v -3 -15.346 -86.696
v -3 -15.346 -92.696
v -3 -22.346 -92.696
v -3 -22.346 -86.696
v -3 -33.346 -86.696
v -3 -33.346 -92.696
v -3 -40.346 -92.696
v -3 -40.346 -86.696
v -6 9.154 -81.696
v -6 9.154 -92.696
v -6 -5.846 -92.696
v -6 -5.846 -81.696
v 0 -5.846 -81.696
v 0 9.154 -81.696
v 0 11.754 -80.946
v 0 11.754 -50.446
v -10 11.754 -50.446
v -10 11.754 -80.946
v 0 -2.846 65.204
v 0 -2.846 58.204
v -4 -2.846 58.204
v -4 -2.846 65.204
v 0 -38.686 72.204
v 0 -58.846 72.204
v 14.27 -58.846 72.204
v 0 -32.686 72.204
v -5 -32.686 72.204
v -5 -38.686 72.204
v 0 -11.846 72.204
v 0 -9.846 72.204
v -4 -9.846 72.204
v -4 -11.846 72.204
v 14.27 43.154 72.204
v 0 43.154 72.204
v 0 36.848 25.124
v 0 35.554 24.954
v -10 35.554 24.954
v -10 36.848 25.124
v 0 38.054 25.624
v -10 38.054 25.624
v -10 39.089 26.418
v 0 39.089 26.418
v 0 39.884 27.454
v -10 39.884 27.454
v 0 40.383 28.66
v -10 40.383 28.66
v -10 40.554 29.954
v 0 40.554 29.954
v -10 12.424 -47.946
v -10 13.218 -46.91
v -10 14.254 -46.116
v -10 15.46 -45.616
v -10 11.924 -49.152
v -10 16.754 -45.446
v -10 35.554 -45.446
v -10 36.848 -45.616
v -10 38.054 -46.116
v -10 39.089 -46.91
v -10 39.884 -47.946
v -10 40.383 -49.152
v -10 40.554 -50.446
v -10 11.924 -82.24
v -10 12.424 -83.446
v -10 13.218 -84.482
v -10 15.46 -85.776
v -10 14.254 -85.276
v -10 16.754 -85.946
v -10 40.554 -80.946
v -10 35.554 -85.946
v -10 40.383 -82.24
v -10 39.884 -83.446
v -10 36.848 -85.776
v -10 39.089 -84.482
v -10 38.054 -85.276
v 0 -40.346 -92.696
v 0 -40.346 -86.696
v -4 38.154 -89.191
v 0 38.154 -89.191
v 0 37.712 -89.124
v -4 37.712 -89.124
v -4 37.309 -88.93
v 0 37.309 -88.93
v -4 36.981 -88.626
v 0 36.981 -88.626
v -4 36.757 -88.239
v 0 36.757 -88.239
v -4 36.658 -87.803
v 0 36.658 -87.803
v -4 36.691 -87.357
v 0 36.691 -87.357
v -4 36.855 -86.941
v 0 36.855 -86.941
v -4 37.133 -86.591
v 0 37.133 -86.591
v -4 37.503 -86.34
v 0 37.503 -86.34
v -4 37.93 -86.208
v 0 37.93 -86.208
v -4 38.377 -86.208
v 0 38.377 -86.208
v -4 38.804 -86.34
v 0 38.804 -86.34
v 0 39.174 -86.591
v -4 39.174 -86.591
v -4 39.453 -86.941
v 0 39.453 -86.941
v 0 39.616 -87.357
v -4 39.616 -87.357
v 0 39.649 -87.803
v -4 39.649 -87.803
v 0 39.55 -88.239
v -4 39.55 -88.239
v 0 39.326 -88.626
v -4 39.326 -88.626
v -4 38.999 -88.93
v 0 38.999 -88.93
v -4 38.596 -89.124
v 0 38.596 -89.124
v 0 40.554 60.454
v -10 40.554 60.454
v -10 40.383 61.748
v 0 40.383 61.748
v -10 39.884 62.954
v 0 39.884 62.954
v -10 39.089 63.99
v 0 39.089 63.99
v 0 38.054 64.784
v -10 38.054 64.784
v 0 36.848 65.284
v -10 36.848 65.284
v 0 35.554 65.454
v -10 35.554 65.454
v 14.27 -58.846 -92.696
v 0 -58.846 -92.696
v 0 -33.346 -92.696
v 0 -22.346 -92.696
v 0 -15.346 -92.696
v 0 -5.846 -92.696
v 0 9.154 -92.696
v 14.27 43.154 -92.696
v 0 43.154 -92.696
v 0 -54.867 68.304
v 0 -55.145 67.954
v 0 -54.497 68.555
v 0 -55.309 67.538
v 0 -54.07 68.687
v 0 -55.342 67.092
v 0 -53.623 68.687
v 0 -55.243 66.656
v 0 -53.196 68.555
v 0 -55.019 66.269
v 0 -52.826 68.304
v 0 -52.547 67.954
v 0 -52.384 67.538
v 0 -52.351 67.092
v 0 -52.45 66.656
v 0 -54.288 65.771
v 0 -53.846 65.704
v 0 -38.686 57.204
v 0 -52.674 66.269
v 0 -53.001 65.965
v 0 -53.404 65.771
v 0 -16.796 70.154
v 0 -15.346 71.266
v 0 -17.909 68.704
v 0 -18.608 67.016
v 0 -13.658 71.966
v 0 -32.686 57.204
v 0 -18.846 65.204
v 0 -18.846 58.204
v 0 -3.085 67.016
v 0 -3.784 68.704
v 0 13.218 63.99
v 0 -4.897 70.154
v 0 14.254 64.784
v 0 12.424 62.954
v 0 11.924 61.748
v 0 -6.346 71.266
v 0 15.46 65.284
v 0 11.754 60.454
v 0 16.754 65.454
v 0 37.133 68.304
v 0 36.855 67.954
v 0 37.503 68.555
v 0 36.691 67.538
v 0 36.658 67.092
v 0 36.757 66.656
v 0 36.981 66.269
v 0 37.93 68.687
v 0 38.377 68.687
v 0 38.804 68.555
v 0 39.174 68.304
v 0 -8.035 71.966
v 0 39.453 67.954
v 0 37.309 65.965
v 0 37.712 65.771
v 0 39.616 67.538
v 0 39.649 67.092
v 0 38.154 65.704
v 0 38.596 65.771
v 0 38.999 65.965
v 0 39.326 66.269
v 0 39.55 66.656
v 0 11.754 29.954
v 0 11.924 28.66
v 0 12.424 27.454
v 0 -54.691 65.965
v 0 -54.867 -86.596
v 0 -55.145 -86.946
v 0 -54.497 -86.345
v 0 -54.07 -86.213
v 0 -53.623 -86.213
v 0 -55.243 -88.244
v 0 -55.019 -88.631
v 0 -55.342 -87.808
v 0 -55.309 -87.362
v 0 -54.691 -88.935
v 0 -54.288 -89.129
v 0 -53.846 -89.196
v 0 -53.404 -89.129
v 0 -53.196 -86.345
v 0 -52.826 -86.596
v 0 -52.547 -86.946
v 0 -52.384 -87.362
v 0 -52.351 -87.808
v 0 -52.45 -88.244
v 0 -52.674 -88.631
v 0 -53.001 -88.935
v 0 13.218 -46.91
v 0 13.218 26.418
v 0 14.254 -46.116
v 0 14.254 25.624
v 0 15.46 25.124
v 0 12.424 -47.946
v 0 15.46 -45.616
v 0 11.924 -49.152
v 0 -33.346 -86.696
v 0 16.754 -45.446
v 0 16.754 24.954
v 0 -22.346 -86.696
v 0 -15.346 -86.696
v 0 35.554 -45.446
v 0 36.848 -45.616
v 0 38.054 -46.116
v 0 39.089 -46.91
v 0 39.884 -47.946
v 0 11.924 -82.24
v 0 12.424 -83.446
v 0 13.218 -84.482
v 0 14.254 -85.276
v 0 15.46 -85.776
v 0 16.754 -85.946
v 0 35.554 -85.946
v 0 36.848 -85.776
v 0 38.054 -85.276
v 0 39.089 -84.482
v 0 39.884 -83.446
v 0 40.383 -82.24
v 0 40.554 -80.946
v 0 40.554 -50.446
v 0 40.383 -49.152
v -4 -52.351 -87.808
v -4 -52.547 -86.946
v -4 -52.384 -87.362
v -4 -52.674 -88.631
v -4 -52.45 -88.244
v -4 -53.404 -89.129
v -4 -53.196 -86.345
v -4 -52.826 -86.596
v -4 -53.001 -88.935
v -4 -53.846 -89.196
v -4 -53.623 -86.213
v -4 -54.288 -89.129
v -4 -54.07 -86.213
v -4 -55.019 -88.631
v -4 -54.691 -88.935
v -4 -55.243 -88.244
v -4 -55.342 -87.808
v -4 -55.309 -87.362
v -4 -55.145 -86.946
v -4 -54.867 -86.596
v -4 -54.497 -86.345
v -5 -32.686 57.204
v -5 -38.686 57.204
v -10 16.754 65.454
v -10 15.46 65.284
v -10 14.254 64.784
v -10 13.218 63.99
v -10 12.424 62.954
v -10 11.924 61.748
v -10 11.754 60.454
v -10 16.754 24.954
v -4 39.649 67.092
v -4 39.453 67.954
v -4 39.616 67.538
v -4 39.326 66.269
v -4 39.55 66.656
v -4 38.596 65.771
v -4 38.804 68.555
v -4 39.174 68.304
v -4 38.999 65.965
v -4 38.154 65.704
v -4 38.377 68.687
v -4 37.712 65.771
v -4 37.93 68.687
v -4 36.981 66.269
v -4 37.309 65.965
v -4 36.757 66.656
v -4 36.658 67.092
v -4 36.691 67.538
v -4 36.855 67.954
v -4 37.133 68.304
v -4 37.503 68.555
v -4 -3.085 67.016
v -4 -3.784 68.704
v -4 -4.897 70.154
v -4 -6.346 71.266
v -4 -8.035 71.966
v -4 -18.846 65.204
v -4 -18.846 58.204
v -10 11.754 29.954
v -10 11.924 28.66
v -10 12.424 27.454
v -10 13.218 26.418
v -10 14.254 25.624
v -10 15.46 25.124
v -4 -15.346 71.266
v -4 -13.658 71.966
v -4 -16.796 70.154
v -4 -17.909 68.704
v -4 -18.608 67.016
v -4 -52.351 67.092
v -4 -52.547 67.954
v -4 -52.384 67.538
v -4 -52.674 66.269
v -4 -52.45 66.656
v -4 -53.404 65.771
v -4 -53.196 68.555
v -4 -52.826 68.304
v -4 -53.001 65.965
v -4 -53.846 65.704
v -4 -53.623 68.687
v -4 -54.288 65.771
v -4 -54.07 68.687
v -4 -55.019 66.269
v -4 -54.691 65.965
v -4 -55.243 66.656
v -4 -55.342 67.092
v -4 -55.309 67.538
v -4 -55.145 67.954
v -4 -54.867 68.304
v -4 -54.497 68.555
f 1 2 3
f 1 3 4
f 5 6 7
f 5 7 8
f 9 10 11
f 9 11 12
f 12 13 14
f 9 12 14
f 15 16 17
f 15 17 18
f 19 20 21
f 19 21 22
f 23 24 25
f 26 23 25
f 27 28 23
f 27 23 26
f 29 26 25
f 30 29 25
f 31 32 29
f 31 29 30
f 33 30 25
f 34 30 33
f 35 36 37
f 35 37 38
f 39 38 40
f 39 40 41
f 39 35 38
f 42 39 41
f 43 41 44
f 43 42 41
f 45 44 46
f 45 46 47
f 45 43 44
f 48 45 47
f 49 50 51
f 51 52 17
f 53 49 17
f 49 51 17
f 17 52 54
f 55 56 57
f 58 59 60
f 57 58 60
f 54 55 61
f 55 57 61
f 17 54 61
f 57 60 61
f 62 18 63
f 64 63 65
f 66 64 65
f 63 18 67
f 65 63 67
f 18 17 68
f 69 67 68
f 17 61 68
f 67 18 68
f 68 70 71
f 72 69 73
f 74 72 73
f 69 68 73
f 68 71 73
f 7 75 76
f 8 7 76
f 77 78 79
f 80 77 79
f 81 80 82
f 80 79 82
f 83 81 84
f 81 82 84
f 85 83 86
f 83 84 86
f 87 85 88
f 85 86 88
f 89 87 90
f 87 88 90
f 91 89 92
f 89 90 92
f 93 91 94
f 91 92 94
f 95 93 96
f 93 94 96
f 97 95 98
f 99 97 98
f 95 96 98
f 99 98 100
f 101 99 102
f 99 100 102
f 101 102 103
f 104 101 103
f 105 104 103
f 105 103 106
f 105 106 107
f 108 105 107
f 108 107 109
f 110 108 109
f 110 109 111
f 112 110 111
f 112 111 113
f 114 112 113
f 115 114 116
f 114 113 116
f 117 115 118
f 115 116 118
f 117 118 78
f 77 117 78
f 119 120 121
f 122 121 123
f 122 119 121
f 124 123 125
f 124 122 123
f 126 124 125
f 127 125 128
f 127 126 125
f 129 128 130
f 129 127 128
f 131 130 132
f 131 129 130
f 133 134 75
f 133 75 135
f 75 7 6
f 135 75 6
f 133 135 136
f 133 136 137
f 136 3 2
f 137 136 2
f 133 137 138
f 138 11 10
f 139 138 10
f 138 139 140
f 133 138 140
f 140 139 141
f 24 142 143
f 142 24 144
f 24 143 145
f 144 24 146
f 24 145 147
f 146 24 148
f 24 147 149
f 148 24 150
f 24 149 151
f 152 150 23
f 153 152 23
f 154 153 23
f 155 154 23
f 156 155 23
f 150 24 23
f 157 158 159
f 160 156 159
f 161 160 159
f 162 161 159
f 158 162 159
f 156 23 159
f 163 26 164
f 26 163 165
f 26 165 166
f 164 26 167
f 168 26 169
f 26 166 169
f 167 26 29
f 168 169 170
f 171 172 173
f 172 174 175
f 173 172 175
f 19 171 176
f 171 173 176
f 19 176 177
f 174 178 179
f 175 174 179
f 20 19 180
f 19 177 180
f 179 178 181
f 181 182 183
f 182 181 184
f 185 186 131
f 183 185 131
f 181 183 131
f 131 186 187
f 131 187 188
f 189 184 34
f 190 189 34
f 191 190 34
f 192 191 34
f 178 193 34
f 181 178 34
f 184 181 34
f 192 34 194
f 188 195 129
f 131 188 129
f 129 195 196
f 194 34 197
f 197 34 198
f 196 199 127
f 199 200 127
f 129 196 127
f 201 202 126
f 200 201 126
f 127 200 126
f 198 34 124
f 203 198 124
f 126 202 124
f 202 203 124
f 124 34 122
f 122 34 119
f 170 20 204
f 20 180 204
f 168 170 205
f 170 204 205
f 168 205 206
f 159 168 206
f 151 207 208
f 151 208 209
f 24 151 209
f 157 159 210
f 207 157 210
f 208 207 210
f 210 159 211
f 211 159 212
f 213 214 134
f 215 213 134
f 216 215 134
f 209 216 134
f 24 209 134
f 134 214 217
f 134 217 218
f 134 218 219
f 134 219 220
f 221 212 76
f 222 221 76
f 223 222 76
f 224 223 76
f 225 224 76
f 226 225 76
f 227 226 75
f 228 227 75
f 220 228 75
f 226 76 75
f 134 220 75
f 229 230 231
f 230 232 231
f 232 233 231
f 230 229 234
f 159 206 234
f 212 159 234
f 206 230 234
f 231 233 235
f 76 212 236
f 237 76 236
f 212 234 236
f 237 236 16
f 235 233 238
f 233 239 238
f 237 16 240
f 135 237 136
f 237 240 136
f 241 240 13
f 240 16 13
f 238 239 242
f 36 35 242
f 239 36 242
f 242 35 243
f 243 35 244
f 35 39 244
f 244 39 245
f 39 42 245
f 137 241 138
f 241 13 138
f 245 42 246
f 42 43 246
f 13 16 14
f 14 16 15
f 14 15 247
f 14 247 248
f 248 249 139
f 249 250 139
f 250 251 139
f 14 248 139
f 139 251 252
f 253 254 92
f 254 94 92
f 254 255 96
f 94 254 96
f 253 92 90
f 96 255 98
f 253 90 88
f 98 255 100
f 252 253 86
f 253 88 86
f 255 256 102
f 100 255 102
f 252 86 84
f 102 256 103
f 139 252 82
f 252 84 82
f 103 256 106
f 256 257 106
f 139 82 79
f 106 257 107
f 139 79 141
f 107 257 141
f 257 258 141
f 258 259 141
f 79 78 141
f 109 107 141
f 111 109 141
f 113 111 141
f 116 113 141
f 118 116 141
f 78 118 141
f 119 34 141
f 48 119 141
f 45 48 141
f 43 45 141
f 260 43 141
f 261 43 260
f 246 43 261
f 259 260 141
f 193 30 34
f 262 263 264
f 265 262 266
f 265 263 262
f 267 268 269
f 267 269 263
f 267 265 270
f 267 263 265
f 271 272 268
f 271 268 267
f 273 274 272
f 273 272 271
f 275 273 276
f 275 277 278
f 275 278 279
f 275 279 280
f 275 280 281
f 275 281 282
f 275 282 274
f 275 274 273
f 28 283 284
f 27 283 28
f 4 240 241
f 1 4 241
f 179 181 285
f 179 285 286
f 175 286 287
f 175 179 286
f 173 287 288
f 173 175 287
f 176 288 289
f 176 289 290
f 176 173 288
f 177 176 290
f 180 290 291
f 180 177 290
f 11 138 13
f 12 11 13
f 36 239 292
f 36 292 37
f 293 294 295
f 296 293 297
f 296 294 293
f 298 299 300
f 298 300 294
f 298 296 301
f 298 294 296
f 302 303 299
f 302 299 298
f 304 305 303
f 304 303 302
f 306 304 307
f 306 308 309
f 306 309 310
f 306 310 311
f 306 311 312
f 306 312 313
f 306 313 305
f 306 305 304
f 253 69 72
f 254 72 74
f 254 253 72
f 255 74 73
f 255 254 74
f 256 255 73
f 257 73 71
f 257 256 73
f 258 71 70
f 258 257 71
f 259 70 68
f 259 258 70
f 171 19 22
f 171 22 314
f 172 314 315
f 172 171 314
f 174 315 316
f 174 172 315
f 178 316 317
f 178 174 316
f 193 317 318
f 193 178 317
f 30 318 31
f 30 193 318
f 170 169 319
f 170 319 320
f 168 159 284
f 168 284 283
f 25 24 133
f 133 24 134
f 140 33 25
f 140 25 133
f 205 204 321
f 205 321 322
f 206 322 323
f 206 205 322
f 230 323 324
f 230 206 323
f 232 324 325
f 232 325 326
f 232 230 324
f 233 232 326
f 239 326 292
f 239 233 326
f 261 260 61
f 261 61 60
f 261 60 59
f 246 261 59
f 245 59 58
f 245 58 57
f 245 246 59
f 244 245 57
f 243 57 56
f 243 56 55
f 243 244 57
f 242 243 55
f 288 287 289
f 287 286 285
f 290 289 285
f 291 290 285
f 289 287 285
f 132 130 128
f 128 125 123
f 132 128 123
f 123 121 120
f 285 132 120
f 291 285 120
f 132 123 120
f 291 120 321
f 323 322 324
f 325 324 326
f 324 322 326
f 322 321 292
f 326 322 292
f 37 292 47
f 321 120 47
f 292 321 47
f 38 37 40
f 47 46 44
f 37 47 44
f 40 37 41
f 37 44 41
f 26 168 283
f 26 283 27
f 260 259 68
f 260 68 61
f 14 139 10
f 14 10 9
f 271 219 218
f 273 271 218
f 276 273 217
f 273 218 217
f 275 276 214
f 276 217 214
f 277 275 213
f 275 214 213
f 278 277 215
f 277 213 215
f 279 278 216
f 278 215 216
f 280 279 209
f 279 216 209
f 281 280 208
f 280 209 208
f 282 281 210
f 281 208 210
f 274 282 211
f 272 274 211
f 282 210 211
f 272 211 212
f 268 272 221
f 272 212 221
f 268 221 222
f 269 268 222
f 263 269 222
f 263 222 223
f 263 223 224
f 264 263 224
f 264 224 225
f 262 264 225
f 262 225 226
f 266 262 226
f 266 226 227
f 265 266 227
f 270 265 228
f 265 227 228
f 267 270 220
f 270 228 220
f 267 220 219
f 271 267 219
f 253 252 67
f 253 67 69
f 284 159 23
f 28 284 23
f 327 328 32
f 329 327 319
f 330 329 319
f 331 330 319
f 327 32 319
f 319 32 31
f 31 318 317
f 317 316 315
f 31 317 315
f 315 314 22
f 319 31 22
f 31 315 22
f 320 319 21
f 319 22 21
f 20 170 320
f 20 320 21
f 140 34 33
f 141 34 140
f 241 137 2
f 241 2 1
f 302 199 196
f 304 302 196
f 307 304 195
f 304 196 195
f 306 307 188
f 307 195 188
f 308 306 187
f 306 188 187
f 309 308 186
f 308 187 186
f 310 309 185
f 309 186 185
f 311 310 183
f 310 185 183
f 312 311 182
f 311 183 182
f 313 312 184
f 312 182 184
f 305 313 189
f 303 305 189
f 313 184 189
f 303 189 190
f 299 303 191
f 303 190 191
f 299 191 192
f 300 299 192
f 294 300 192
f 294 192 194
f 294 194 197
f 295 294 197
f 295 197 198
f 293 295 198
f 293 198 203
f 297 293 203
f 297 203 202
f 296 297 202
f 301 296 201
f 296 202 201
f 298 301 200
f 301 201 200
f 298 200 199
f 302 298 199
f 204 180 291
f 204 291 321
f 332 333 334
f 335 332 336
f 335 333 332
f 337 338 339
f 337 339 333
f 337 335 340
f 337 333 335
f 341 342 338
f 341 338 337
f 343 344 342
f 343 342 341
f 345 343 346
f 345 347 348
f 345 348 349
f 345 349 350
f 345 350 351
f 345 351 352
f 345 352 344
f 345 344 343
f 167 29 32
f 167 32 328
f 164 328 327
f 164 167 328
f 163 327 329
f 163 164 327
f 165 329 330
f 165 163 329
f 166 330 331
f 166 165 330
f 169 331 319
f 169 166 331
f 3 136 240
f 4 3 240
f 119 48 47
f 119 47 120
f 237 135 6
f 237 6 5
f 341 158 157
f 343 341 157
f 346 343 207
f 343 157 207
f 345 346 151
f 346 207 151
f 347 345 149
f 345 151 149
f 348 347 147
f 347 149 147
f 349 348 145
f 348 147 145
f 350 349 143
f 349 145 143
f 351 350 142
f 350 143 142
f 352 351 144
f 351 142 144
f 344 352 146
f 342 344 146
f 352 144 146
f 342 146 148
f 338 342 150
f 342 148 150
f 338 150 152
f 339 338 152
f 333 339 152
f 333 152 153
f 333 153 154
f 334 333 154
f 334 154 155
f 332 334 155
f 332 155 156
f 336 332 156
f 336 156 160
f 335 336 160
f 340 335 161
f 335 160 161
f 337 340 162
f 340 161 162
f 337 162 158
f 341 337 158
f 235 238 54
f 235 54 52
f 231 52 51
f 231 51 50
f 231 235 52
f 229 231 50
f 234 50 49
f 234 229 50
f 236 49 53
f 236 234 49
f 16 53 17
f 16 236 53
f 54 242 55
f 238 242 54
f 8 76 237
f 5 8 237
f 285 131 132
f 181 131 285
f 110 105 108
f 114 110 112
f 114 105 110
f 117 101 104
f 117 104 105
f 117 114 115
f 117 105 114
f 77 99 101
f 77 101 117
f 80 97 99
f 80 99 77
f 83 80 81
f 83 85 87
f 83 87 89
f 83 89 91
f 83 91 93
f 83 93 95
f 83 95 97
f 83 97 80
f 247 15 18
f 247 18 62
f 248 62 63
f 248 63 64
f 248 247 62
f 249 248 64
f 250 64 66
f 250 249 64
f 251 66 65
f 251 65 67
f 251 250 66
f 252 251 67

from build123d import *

# Parameters (mm, degrees)
CROQUIS1_W              = 164.9
CROQUIS1_H              = 102
SALIENTE_EXTRUIR1_DEPTH = 14.27
CROQUIS2_W              = 11
CROQUIS2_H              = 15
SALIENTE_EXTRUIR3_DEPTH = 6
CROQUIS3_W              = 6
CROQUIS3_H              = 7
SALIENTE_EXTRUIR4_DEPTH = 3
CROQUIS4_W              = 15
CROQUIS4_H              = 6
SALIENTE_EXTRUIR5_DEPTH = 5
SALIENTE_EXTRUIR6_DEPTH = 10
SALIENTE_EXTRUIR7_DEPTH = 4
CROQUIS7_R              = 1.5
SALIENTE_EXTRUIR8_DEPTH = 4


with BuildPart() as part:
    # Croquis1 → Saliente-Extruir1 (new body)
    with BuildSketch(Plane(origin=(0, 0, 0), x_dir=(0, 0, -1), z_dir=(1, 0, 0))):
        with Locations((10.245979532, -7.846345029)):
            Rectangle(CROQUIS1_W, CROQUIS1_H)
    extrude(amount=SALIENTE_EXTRUIR1_DEPTH)

    # Croquis2 → Saliente-Extruir3 (add)
    with BuildSketch(Plane.ZY):
        with Locations((-87.195979532, 1.653654971)):
            Rectangle(CROQUIS2_W, CROQUIS2_H)
    extrude(amount=SALIENTE_EXTRUIR3_DEPTH)

    # Croquis3 → Saliente-Extruir4 (add)
    with BuildSketch(Plane.ZY):
        with Locations((-89.695979532, -36.846345029)):
            Rectangle(CROQUIS3_W, CROQUIS3_H)
        with Locations((-89.695979532, -18.846345029)):
            Rectangle(CROQUIS3_W, CROQUIS3_H)
    extrude(amount=SALIENTE_EXTRUIR4_DEPTH)

    # Croquis4 → Saliente-Extruir5 (add)
    with BuildSketch(Plane.ZY):
        with Locations((64.704020468, -35.686345029)):
            Rectangle(CROQUIS4_W, CROQUIS4_H)
    extrude(amount=SALIENTE_EXTRUIR5_DEPTH)

    # Croquis5 → Saliente-Extruir6 (add)
    with BuildSketch(Plane.ZY):
        with BuildLine():
            Line((-80.945979532, 40.553654971), (-50.445979532, 40.553654971))
            ThreePointArc((-50.445979532, 40.553654971), (-46.910445626, 39.089188877), (-45.445979532, 35.553654971))
            Line((-45.445979532, 35.553654971), (-45.445979532, 16.753654971))
            ThreePointArc((-45.445979532, 16.753654971), (-46.910445626, 13.218121065), (-50.445979532, 11.753654971))
            Line((-50.445979532, 11.753654971), (-80.945979532, 11.753654971))
            ThreePointArc((-80.945979532, 11.753654971), (-84.481513438, 13.218121065), (-85.945979532, 16.753654971))
            Line((-85.945979532, 16.753654971), (-85.945979532, 35.553654971))
            ThreePointArc((-85.945979532, 35.553654971), (-84.481513438, 39.089188877), (-80.945979532, 40.553654971))
        make_face()
        with BuildLine():
            Line((29.954020468, 40.553654971), (60.454020468, 40.553654971))
            ThreePointArc((60.454020468, 40.553654971), (63.989554374, 39.089188877), (65.454020468, 35.553654971))
            Line((65.454020468, 35.553654971), (65.454020468, 16.753654971))
            ThreePointArc((65.454020468, 16.753654971), (63.989554374, 13.218121065), (60.454020468, 11.753654971))
            Line((60.454020468, 11.753654971), (29.954020468, 11.753654971))
            ThreePointArc((29.954020468, 11.753654971), (26.418486562, 13.218121065), (24.954020468, 16.753654971))
            Line((24.954020468, 16.753654971), (24.954020468, 35.553654971))
            ThreePointArc((24.954020468, 35.553654971), (26.418486562, 39.089188877), (29.954020468, 40.553654971))
        make_face()
    extrude(amount=SALIENTE_EXTRUIR6_DEPTH)

    # Croquis6 → Saliente-Extruir7 (add)
    with BuildSketch(Plane.ZY):
        with BuildLine():
            Line((58.204020468, -2.846345029), (65.204020468, -2.846345029))
            ThreePointArc((65.204020468, -2.846345029), (70.153767936, -4.896597561), (72.204020468, -9.846345029))
            Line((72.204020468, -9.846345029), (72.204020468, -11.846345029))
            ThreePointArc((72.204020468, -11.846345029), (70.153767936, -16.796092498), (65.204020468, -18.846345029))
            Line((65.204020468, -18.846345029), (58.204020468, -18.846345029))
            Line((58.204020468, -18.846345029), (58.204020468, -2.846345029))
        make_face()
    extrude(amount=SALIENTE_EXTRUIR7_DEPTH)

    # Croquis7 → Saliente-Extruir8 (add)
    with BuildSketch(Plane.ZY):
        with Locations(Location((-87.690979532, 38.153654971, 0), (0, 0, 180))):
            Circle(CROQUIS7_R)
        with Locations(Location((67.204020468, 38.153654971, 0), (0, 0, 180))):
            Circle(CROQUIS7_R)
        with Locations(Location((-87.695979532, -53.846345029, 0), (0, 0, 180))):
            Circle(CROQUIS7_R)
        with Locations(Location((67.204020468, -53.846345029, 0), (0, 0, 180))):
            Circle(CROQUIS7_R)
    extrude(amount=SALIENTE_EXTRUIR8_DEPTH)


solid = part.part
